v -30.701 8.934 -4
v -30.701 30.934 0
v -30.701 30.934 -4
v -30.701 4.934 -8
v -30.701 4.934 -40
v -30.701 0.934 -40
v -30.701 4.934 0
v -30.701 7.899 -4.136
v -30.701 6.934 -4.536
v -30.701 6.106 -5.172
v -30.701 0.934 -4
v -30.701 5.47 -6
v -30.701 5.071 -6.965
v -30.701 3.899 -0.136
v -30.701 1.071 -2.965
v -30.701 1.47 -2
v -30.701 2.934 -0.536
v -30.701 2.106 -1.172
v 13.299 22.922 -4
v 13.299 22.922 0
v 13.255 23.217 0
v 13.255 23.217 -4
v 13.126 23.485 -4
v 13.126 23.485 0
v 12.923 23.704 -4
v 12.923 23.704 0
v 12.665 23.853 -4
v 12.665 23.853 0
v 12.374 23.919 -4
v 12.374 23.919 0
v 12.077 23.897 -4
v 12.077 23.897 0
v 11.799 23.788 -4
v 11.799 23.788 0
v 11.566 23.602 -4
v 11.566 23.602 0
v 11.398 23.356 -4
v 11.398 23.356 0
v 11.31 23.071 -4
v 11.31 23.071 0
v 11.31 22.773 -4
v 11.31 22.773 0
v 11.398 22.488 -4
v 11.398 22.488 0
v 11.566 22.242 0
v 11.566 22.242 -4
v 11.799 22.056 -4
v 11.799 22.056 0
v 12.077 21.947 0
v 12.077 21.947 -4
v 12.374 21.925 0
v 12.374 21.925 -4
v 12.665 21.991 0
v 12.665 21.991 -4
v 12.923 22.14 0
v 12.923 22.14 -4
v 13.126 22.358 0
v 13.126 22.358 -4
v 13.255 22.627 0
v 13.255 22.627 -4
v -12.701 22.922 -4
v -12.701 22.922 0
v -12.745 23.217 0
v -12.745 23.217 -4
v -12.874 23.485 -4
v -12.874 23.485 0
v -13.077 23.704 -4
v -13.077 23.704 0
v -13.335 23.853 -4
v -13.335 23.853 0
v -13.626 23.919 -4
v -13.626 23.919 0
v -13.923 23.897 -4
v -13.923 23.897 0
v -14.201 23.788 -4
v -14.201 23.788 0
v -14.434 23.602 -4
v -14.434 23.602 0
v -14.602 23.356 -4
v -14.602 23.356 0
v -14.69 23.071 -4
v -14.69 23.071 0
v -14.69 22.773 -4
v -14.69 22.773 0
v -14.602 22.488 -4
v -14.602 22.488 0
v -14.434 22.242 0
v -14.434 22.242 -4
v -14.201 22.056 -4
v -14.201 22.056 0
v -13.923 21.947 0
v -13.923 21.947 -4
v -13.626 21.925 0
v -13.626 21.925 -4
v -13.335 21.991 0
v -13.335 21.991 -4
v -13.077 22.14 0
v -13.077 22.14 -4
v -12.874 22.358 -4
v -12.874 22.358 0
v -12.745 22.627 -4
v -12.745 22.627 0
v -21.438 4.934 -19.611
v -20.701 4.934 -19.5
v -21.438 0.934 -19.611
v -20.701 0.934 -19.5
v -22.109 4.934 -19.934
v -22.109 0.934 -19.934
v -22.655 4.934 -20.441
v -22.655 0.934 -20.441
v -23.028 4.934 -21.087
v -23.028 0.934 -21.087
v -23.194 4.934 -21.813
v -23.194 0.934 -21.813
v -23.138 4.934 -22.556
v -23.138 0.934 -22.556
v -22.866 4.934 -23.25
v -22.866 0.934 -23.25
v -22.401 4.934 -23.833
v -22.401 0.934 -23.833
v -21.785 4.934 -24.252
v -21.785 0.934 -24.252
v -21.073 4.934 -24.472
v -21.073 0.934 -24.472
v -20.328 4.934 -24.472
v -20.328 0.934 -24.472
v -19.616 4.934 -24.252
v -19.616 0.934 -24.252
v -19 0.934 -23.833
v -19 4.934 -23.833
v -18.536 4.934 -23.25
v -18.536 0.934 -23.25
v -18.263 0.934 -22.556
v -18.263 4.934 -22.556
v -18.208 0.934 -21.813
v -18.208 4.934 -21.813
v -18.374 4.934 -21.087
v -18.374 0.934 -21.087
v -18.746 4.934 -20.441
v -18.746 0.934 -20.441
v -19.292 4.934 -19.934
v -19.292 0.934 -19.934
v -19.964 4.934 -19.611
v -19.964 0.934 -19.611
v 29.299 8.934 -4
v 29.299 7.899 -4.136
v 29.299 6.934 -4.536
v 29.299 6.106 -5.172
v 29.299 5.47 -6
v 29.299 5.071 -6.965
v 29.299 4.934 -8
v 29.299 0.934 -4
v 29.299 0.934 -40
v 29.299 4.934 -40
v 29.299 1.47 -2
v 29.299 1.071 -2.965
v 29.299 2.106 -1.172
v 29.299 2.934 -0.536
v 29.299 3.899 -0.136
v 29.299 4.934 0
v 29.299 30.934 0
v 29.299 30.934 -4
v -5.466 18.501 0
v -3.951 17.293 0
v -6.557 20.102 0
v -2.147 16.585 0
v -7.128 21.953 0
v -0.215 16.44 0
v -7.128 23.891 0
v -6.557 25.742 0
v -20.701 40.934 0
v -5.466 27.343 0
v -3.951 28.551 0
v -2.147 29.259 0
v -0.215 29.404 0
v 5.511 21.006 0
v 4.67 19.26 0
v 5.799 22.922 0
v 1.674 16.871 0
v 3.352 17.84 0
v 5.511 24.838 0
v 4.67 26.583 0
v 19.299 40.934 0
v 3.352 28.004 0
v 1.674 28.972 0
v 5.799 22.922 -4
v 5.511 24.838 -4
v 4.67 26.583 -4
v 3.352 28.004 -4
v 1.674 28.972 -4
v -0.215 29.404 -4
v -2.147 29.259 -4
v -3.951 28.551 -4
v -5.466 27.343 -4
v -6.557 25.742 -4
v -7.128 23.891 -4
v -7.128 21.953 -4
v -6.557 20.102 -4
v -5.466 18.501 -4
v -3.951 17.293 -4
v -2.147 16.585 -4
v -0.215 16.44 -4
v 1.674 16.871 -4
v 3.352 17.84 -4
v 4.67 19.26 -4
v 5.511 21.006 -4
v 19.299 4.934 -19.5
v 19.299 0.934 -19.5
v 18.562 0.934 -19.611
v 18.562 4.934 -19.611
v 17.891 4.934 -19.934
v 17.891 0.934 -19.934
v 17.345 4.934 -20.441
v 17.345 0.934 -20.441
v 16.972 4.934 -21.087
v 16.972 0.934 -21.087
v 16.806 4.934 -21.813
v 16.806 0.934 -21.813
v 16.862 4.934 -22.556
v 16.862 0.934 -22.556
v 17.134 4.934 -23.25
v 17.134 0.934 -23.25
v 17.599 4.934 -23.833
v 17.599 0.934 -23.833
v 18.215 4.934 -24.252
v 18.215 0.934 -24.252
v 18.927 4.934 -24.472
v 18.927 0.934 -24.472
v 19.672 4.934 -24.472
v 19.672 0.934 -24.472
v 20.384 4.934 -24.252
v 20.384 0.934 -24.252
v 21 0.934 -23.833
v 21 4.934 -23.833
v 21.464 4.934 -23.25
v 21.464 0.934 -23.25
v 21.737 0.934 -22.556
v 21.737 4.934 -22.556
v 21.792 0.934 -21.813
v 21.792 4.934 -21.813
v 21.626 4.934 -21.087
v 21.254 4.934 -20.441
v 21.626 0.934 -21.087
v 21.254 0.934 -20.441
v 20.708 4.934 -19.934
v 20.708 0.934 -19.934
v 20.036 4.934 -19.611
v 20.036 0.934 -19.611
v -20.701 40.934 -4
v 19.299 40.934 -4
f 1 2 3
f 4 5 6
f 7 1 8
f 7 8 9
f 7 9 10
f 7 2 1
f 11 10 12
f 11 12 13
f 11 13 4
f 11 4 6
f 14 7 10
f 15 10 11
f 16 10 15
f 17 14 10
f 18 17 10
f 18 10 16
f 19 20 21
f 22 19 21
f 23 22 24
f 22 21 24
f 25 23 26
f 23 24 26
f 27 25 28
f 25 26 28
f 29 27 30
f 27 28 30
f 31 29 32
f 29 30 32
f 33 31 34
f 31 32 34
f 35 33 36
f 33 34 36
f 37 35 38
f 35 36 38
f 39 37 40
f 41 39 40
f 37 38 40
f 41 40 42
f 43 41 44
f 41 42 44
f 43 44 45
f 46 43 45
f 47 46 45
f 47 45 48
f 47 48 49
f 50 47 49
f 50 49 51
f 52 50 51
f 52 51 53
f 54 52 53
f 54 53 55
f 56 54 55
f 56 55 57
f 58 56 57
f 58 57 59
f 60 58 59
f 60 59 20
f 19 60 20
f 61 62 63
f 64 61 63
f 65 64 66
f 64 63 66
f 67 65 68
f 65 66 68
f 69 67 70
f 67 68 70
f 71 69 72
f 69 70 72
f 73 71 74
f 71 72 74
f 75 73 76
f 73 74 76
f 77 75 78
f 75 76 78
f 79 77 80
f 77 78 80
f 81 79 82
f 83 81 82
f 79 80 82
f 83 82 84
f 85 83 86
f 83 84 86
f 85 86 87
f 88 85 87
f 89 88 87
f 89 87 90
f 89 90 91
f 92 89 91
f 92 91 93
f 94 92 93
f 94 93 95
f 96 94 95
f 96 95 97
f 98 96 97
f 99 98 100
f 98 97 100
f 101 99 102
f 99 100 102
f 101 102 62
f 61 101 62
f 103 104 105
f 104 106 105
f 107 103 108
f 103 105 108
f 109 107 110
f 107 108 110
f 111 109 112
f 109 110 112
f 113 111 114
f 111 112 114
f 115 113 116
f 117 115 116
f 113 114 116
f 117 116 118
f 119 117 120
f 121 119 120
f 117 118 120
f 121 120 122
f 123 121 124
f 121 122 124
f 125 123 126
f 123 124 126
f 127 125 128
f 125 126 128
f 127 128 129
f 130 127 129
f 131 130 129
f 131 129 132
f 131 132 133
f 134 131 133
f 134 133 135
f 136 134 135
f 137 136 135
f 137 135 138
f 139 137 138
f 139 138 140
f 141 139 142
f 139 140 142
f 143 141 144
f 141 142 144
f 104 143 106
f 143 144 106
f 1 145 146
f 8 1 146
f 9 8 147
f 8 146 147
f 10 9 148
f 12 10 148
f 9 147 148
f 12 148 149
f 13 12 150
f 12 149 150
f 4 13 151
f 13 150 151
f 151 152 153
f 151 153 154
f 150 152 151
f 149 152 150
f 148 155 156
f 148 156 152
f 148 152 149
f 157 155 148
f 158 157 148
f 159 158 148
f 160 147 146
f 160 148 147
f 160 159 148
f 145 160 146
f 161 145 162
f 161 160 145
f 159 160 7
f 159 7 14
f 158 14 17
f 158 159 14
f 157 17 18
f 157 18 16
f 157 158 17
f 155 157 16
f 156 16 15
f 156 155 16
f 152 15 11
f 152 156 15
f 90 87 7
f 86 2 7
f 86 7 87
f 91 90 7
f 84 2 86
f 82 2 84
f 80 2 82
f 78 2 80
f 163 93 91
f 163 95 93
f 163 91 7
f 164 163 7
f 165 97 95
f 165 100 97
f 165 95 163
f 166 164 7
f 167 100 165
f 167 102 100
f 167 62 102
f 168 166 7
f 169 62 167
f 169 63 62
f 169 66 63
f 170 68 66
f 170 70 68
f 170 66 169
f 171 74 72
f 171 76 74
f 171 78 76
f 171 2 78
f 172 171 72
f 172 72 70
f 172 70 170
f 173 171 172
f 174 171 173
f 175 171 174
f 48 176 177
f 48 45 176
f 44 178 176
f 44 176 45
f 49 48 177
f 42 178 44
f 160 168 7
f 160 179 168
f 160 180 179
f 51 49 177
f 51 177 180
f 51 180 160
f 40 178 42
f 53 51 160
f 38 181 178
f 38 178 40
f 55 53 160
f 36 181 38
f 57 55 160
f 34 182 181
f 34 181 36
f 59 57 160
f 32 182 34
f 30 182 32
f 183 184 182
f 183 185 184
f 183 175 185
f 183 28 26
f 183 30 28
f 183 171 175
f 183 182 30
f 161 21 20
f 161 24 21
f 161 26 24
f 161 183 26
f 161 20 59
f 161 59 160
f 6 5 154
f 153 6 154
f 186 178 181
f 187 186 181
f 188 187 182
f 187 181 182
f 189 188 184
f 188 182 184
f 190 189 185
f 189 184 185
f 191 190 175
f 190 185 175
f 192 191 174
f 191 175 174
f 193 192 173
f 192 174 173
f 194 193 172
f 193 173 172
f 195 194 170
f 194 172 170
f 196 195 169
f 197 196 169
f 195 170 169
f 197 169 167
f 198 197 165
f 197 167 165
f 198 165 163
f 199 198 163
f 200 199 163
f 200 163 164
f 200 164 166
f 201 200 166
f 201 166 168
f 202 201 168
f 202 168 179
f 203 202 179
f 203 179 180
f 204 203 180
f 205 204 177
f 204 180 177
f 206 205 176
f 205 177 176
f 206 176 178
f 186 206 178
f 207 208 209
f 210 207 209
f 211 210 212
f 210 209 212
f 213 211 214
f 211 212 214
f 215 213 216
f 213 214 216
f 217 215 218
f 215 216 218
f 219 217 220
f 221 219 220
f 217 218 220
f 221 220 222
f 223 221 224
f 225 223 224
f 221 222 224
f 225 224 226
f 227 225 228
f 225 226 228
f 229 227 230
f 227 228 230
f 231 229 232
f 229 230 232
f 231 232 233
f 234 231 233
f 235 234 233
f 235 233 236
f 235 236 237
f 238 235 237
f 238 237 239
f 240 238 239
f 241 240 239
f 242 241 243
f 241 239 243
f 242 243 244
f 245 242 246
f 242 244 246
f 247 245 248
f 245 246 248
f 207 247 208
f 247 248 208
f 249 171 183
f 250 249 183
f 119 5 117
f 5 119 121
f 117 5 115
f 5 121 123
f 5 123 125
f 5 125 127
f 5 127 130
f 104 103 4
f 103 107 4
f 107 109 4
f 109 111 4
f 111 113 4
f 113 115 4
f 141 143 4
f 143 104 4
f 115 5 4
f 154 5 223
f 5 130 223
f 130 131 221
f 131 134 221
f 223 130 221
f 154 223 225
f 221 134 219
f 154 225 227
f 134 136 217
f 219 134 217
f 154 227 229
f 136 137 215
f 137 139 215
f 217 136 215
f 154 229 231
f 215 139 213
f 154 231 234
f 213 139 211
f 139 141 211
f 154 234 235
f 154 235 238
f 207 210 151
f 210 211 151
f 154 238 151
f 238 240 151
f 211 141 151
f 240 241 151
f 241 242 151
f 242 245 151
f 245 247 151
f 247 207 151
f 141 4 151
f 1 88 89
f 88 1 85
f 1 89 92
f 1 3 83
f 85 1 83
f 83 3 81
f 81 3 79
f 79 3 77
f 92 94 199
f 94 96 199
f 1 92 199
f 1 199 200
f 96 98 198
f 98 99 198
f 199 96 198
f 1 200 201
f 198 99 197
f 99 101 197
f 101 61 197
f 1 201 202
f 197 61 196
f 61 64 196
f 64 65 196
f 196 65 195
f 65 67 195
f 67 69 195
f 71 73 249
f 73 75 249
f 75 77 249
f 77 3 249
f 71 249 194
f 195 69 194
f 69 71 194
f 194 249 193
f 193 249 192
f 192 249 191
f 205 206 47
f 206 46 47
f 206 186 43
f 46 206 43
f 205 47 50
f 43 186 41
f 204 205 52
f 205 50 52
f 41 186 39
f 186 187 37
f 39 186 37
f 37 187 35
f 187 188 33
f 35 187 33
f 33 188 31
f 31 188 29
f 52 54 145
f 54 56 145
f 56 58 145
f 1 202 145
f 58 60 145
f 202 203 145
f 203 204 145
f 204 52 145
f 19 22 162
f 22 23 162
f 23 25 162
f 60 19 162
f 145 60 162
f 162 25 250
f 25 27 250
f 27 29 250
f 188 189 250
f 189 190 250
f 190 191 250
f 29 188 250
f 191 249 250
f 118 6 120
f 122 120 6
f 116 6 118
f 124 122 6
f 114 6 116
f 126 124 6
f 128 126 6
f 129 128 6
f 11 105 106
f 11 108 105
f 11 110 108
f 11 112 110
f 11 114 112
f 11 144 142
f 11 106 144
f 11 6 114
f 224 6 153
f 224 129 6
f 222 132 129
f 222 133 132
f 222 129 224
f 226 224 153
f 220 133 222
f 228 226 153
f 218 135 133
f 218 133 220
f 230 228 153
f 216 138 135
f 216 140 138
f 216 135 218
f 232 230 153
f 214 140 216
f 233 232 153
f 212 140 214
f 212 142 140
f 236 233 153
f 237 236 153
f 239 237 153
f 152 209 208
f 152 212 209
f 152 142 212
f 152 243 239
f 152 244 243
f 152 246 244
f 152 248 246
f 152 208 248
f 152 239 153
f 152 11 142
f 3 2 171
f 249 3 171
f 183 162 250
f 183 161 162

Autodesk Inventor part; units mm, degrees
ref_plane "YZ Plane" through (0, 0, 0) normal (1, 0, 0) x (0, 1, 0)
ref_plane "XZ Plane" through (0, 0, 0) normal (0, 1, 0) x (-1, 0, 0)
ref_plane "XY Plane" through (0, 0, 0) normal (0, 0, 1) x (1, 0, 0)
sketch "Sketch1" plane through (0, 0, 0) normal (0, 0, 1) x (1, 0, 0)
  line L0 (-30.7007, 0.9343) -> (29.2993, 0.9343)
  line L1 (-30.7007, 0.9343) -> (29.2993, 0.9343) construction
  line L2 (29.2993, 0.9343) -> (29.2993, 30.9343)
  line L3 (-30.7007, 30.9343) -> (-30.7007, 0.9343)
  line L4 (-30.7007, 4.9343) -> (29.2993, 4.9343)
  line L5 (-30.7007, 30.9343) -> (-20.7007, 40.9343)
  line L6 (-30.7007, 30.9343) -> (-16.5586, 30.9343) construction
  line L7 (-0.7007, 4.9343) -> (-0.7007, 40.9093) construction
  circle A0 centre (-0.7007, 22.9218) radius 6.5
  line L8 (-0.7007, 22.9218) -> (29.2993, 22.9218) construction
  circle A1 centre (12.2993, 22.9218) radius 1
  line L9 (29.2993, 30.9343) -> (19.2993, 40.9343)
  line L10 (-20.7007, 40.9343) -> (19.2993, 40.9343)
  line L11 (-0.7007, 22.9218) -> (-30.7007, 22.9218) construction
  circle A2 centre (-13.7007, 22.9218) radius 1
  point P0 (-30.2757, 2.8287)
  dimension "d13" = 60
  dimension "d15" = 30
  dimension "d17" = 45
  dimension "d20" = 4
  dimension "d53" = 13
  dimension "d56" = 13
  dimension "d57" = 2
  dimension "d58" = 40
extrude "Extrusion3" add sketch "Sketch1" against normal blind 4 contours L3 L5 L10 L9 L2 L4
extrude "Extrusion4" add sketch "Sketch1" against normal blind 40 contours L3 L4 L2 L0
sketch "Sketch4" plane through (-30.7007, 4.9343, -4) normal (0, 1, 0) x (1, 0, 0)
  line L0 (60, 0) -> (60, 36) projected
  line L1 (60, 18) -> (0, 18) construction
  line L2 (0, 0) -> (0, 36) projected
  line L3 (0, 36) -> (60, 36) projected
  line L4 (30, 36) -> (30, 0) construction
  line L5 (10, 0) -> (50, 0) projected
  circle A0 centre (50, 18) radius 2.5
  circle A1 centre (10, 18) radius 2.5
  point P0 (30.7007, -4)
  dimension "d63" = 10
  dimension "d64" = 5
hole "Hole3" at (19.2993, 4.9343, -22) at (-20.7007, 4.9343, -22) direction (0, -1, 0) diameter 5 end through all
thread "Thread1" size "M6x1" class "6H" standard "ANSI Metric M Profile" full length
thread "Thread2" size "M6x1" class "6H" standard "ANSI Metric M Profile" full length
fillet "Fillet2" radius 4 1 edges at (-0.7007, 4.9343, -4)
fillet "Fillet3" radius 4 1 edges at (-0.7007, 0.9343, 0)
thread "Thread3" size "M6x1" class "6H" standard "ANSI Metric M Profile" full length
thread "Thread4" size "M5x0.8" class "6H" standard "ANSI Metric M Profile" full length
thread "Thread5" size "M5x0.8" class "6H" standard "ANSI Metric M Profile" full length
thread "Thread6" size "M5x0.8" class "6H" standard "ANSI Metric M Profile" full length
properties part number "MotorHolder" material "Steel, Alloy"
